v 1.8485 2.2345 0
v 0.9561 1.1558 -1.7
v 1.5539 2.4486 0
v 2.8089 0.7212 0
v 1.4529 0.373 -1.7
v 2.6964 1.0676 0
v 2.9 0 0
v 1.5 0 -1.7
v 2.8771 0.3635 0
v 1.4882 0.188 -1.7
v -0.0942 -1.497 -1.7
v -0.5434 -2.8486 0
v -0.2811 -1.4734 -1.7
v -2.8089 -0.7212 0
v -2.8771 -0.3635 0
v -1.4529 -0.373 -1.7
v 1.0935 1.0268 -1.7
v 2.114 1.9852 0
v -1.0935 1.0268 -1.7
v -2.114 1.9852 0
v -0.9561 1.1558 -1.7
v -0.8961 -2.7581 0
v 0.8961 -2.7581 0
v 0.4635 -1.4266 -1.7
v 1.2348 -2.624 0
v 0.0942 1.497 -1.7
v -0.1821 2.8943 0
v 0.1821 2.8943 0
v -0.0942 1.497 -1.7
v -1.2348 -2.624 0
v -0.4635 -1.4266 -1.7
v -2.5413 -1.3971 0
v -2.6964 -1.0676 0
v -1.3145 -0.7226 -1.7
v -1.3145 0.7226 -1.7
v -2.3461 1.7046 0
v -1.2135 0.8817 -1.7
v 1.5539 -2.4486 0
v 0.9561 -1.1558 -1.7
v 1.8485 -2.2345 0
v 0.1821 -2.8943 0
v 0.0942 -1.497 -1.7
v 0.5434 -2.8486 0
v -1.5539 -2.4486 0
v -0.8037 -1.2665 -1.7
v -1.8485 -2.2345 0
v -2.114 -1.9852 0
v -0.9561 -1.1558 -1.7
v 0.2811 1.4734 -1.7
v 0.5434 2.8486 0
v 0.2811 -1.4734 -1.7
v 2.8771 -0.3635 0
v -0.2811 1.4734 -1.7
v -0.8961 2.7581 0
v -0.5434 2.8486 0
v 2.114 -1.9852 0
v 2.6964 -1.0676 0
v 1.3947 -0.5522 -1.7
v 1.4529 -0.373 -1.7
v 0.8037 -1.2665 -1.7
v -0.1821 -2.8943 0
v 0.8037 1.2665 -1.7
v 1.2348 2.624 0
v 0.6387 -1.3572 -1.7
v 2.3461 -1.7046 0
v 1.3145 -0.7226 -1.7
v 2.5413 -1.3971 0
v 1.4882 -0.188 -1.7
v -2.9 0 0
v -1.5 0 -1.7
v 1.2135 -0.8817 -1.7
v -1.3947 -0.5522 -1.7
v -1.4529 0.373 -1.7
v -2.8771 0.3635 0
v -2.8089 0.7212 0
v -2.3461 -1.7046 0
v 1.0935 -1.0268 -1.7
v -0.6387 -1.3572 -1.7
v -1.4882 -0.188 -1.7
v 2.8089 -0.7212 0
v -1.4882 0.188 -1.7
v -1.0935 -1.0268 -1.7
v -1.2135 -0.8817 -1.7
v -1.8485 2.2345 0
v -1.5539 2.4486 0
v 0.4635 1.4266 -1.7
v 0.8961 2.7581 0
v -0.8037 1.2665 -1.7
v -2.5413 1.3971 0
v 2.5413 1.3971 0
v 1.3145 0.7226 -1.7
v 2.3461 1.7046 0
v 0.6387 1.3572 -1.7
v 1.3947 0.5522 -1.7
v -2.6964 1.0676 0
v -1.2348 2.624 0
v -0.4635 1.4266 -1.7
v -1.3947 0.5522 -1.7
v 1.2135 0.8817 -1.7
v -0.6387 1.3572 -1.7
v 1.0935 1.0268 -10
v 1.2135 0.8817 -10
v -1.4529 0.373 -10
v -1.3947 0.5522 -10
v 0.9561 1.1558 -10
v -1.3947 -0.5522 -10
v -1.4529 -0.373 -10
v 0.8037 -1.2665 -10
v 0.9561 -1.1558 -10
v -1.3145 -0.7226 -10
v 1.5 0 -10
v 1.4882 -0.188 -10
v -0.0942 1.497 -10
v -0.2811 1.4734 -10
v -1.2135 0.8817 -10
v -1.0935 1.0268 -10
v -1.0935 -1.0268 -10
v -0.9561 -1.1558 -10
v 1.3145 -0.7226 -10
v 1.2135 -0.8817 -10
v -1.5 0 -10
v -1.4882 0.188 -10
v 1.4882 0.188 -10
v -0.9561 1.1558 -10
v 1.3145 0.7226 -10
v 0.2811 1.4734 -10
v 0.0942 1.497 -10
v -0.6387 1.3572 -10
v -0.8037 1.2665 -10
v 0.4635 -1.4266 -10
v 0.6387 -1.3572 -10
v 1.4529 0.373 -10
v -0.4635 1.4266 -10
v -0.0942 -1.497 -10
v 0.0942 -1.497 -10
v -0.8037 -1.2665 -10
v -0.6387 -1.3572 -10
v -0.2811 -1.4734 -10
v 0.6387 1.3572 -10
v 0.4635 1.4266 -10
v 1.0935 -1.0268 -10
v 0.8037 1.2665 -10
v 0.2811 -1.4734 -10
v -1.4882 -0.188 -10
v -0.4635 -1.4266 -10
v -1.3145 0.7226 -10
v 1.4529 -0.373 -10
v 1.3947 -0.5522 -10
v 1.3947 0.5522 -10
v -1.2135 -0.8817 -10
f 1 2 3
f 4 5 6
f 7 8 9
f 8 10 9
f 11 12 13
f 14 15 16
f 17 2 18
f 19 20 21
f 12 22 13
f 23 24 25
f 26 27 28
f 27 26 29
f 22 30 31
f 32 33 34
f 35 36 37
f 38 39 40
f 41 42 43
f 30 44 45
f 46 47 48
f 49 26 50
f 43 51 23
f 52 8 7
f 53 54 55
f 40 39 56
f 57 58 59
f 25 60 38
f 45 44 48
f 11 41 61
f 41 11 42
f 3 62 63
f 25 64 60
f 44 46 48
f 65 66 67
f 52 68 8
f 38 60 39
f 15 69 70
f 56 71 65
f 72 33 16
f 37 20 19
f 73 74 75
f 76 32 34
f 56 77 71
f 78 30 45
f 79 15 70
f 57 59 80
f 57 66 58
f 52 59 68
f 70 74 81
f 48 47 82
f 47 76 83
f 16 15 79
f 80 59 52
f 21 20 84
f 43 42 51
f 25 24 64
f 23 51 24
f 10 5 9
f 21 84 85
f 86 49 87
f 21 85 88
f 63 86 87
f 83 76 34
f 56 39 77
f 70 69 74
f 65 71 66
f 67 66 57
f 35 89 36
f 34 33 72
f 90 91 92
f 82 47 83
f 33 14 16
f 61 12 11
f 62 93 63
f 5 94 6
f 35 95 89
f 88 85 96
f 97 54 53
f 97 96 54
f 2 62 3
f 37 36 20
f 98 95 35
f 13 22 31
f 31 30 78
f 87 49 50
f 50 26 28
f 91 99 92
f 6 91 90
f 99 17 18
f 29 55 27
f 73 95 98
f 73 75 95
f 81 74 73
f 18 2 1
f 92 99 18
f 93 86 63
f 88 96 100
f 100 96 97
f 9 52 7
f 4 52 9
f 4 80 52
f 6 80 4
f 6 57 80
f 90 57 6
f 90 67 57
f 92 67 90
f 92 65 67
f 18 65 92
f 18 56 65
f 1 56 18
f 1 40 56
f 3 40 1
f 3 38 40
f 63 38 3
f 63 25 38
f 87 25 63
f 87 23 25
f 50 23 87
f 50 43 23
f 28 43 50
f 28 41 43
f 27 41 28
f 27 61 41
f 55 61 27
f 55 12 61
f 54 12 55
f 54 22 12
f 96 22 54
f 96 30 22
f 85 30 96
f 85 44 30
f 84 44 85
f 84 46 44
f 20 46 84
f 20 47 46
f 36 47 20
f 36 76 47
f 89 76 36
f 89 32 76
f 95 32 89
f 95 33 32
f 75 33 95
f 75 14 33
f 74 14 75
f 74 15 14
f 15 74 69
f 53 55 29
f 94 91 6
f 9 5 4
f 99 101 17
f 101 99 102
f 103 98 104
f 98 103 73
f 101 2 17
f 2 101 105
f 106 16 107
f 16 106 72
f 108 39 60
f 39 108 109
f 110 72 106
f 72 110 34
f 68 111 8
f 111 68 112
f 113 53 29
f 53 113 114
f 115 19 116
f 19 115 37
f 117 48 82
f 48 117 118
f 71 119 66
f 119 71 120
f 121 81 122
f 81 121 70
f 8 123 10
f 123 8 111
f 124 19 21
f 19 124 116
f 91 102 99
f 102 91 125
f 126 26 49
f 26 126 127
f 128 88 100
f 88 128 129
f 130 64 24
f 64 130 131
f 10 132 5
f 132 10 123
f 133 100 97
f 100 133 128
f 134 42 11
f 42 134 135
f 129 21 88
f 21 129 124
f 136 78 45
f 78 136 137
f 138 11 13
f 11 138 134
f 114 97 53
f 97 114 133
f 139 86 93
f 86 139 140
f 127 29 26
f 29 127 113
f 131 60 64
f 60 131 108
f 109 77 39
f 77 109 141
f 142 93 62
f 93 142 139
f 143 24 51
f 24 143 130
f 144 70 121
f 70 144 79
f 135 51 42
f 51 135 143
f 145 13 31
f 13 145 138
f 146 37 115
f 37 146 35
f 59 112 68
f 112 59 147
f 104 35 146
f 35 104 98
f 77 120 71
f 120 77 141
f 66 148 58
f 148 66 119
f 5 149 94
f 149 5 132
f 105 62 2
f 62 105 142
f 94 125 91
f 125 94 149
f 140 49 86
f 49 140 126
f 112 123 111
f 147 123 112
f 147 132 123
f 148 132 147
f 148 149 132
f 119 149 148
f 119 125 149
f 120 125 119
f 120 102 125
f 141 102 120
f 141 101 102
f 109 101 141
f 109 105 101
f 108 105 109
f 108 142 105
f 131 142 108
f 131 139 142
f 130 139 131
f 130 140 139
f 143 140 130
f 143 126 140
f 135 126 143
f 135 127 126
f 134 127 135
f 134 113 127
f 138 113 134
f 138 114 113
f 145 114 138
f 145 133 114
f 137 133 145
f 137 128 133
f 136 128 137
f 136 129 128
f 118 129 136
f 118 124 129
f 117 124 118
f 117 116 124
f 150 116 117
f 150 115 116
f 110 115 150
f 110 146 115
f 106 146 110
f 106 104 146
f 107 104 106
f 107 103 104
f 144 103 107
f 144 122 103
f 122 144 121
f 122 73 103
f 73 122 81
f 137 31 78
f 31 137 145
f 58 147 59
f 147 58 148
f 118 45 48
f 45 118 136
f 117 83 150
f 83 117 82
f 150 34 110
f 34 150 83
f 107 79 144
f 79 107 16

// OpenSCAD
// Generated by SolidPython 1.1.3 on 2023-03-13 21:43:02
$fn = 50;


difference() {
	union() {
		translate(v = [0, 0, -1.7000000000]) {
			rotate(a = [0, 0, 0]) {
				cylinder(h = 1.7000000000, r1 = 1.5000000000, r2 = 2.9000000000);
			}
		}
		translate(v = [0, 0, -10]) {
			rotate(a = [0, 0, 0]) {
				cylinder(h = 10, r = 1.5000000000);
			}
		}
	}
	union();
}
/***********************************************
*********      SolidPython code:      **********
************************************************
 
from solid import *
import os
import subprocess

import oomB

import opsc_library_gen

mode = "laser"
#mode = "3d_print"

defined_objects = {}

radius_dict = {}
countersunk_dict = {}


def set_mode(m):
    global mode
    mode = m
    radius_dict['M6'] = 6.5/2
    radius_dict['M3'] = 3.3/2
    if mode == "laser":
        radius_dict['M6'] = 6/2
        radius_dict['M3'] = 3/2

    countersunk_dict['M3'] = {}
    countersunk_dict['M3']['little_rad'] = radius_dict['M3']
    countersunk_dict['M3']['big_rad'] = (5.5+0.6)/2
    if mode == "laser":
        countersunk_dict['M3']['big_rad'] = (4.75+0.6)/2
        countersunk_dict['M3']['little_rad'] = (4.75+0.6)/2

    countersunk_dict['M3']['height'] = 1.7


def opsc_make_object(filename, objects, save_type="none",resolution=50, layers = 1, tilediff = 200, mode="laser", overwrite=True):
    if overwrite or not os.path.exists(filename):
        set_mode(mode)
        save_type = save_type.lower()
        os.makedirs(os.path.dirname(filename), exist_ok=True)
        final_object = opsc_get_object(objects, mode = mode)
        # Save the final object to the specified filename    
        scad_render_to_file(final_object, filename, file_header='$fn = %s;' % resolution, include_orig_code=True)
        if save_type == "all":
            saveToAll(filename)
        elif save_type == "dxf":
            saveToDxf(filename)
        if mode == "laser":
            filename_laser = filename.replace(".scad","-flat.scad")
            scad_render_to_file(getLaser(final_object, layers=layers, tilediff=tilediff), filename_laser, file_header='$fn = %s;' % resolution, include_orig_code=True)
            if save_type == "all":
                saveToAll(filename_laser)
            elif save_type == "dxf":
                saveToDxf(filename_laser)


def opsc_get_object(objects, mode = "laser"):
    # Create the solidpython objects only include the positive objects and if they don't have inclusion or their inclusion is either all or mode
    # Initialize an empty list to store the results
    positive_objects = []

    # Iterate over the "objects" list
    for obj in objects:
        # Check if the current object has a "type" key with a value of "positive"
        if obj['type'] == 'positive':
            # Check if the current object has an "inclusion" key and its value matches "mode",
            # or if the current object does not have an "inclusion" key at all
            if not 'inclusion' in obj or obj['inclusion'] == "all" or obj['inclusion'] == mode:
                # Call the "get_opsc_item" function with the current object as an argument
                opsc_item = get_opsc_item(obj)
                # Add the result to the "positive_objects" list
                positive_objects.append(opsc_item)
# Initialize an empty list to store the results
    negative_objects = []

    # Iterate over the "objects" list
    for obj in objects:
        # Check if the current object has a "type" key with a value of "negative"
        if obj['type'] == 'negative':
            # Check if the current object has an "inclusion" key and its value matches "mode",
            # or if the current object does not have an "inclusion" key at all
            if not 'inclusion' in obj or obj['inclusion'] == "all" or obj['inclusion'] == mode:
                # Call the "get_opsc_item" function with the current object as an argument
                opsc_item = get_opsc_item(obj)
                # Add the result to the "negative_objects" list
                negative_objects.append(opsc_item)
    
    #positive_objects = [get_opsc_item(obj) for obj in objects if obj['type'] == 'positive']
    #negative_objects = [get_opsc_item(obj) for obj in objects if obj['type'] == 'negative']
    # Union the positive objects
    positive_object = union()(*positive_objects)
    # Union the negative objects
    negative_object = union()(*negative_objects)
    # Create the final object by subtracting the negative objects from the positive objects
    return difference()(positive_object, negative_object)

def get_opsc_item(params):
    # A dictionary to map radius string values to numerical values
    #radius_dict = {'small': 5, 'medium': 10, 'large': 15}
    # An array of function names for basic shapes
    basic_shapes = ['cube', 'sphere', 'cylinder']
    
    # An array of function names for other shapes
    other_shapes = ['hole', 'slot', 'rounded_rectangle', 'countersunk', 'polyg']
    


    # Convert radius to r if present, and remove radius from the params dictionary
    if 'radius' in params:
        if isinstance(params['radius'], str):
            # Use the radius_dict to map the radius string value to a numerical value
            params['r'] = radius_dict[params['radius']]
        else:
            params['r'] = params['radius']
        del params['radius']
    

    # Check if the object type is a basic shape
    if params['shape'] in basic_shapes:
        # Remove shape and unexpected dictionary values
        allowed_keys = {'size', 'r', 'r1', 'r2', 'd', 'h', 'rw', 'rh', 'dw', 'dh'}
        shape_params = {k: v for k, v in params.items() if k in allowed_keys}

        #params['m'] = "#"
        ###split for adding modifier
        try:
            m = params['m']
            func = globals()[params['shape']]
            return_value = get_opsc_transform(params,func(**shape_params))
            return_value = (return_value).set_modifier(m)
            return return_value
        except KeyError as e:
            return get_opsc_transform(params,globals()[params['shape']](**shape_params))
        
    elif params['shape'] == 'polygon':
        # Remove shape and unexpected dictionary values
        h  = params['height']
        allowed_keys = {'points'}
        shape_params = {k: v for k, v in params.items() if k in allowed_keys}

        # Call the corresponding function for the shape parameter, using ** notation to pass the shape_params dictionary as keyword arguments
        params["rot"] = [0,0,0]        
        try:
            m = params['m']
            func = globals()[params['shape']]
            return_value = get_opsc_transform(params,linear_extrude(h)(globals()[params['shape']](**shape_params)))
            return_value = (return_value).set_modifier(m)
            return return_value
        except KeyError as e:
            return_value = get_opsc_transform(params,linear_extrude(h)(globals()[params['shape']](**shape_params)))
            return_value = (return_value)
            return return_value


    # If the object type is not a basic shape, check if it's a defined object or one of the other shapes
    elif params['shape'] in other_shapes:
        # Call the corresponding function for the shape parameter, passing the params dictionary as an argument
        p2 = copy.deepcopy(params)
        p2["pos"] = [0,0,0]
        return get_opsc_transform(params,globals()[params['shape']](p2))
    
    # If the object is not a basic shape or a defined object, try to import it from a .scad file
    else:
        obj = defined_objects[params['shape']]
        return get_opsc_transform(params,obj)

def get_opsc_transform(params, solid_obj):
    # Rotate the object based on the 'rot' field in the params dictionary, or the 'rotX', 'rotY', and 'rotZ' fields if 'rot' is not present
    rot = params.get('rot', [])
    if rot:
        rotX, rotY, rotZ = rot
    else:
        rotX = params.get('rotX', 0)
        rotY = params.get('rotY', 0)
        rotZ = params.get('rotZ', 0)
    solid_obj = rotate([rotX, rotY, rotZ])(solid_obj)

    # Translate the object based on the 'pos' field in the params dictionary, or the 'x', 'y', and 'z' fields if 'pos' is not present
    pos = params.get('pos', [])
    if pos:
        x, y, z = pos
    else:
        x = params.get('x', 0)
        y = params.get('y', 0)
        z = params.get('z', 0)
    solid_obj = translate([x, y, z])(solid_obj)
    return solid_obj


import random

def opsc_easy_array(type, shape, repeats, pos_start, shift_arr, **kwargs):
    for i in range(0,3):
        repeats.append(1)
        pos_start.append(0)
        shift_arr.append(0)
    return_objects = []

    for x in range(0,repeats[0]):
        for y in range(0,repeats[1]):
            for z in range(0,repeats[2]):
                return_objects.append(opsc_easy(type, shape, pos=[pos_start[0]+x*shift_arr[0],pos_start[1]+y*shift_arr[1],pos_start[2]+z*shift_arr[2]], **kwargs))
    return return_objects                



def opsc_easy(type, shape, **kwargs):
    obj = {
        'type': type,
        'shape': shape
    }
    for param in ['size', 'r', 'r1', 'r2', 'd', 'h', 'rw', 'rh', 'dw', 'dh', 'pos', 'x', 'y', 'z', 'rot', 'rotX', 'rotY', 'rotZ', "w", "inclusion", 'sides', 'height', "m"]:
        if param in kwargs:
            obj[param] = kwargs[param]
    return obj

def hole(params):
    p2 = copy.deepcopy(params)  
    # Check if the radius is a string and replace it with the corresponding value from the dictionary
    if isinstance(p2['r'], str):
        p2['r'] = radius_dict[p2['r']]
    
    # Set the height to 100 if not specified
    if 'h' not in p2:
        p2['h'] = 100
        p2["pos"] = [0,0,-50]
    p2["center"] = True
    # Create the cylinder object
    p2["shape"] = "cylinder"
    p2["type"] = "positive"

    return get_opsc_item(p2)

import copy

def countersunk(params):
    p2 = copy.deepcopy(params)
    counter_rad = p2['r']
    p2['r'] = radius_dict[p2['r']]
    hp = copy.deepcopy(p2)
    hp["type"] = "positive"
    hp["shape"] = "hole"
    del hp["rot"]
    hol = get_opsc_item(hp)
    
    cp = copy.deepcopy(p2)
    cp["h"] = countersunk_dict[counter_rad]["height"]
    cp["r2"] = countersunk_dict[counter_rad]["little_rad"]
    cp["r1"] = countersunk_dict[counter_rad]["big_rad"]
    del cp["r"]
    del cp["rot"]
    cp["type"] = "positive"
    cp["shape"] = "cylinder"
    cp["pos"] = [0,0,0]

    top = get_opsc_item(cp)
    return union()(hol,top)



def slot(params):  
    p2 = copy.deepcopy(params) 
    if isinstance(p2['r'], str):
        p2['r'] = radius_dict[p2['r']]
    p2["type"] = "positive"
    p2["shape"] = "hole"
    del p2["rot"]
    p2["pos"] = [0,0,0]
    left = copy.deepcopy(p2)
    right = copy.deepcopy(p2)
    left["pos"][0] = p2["w"] / 2 - p2["r"] 
    
    right["pos"][0] = -p2["w"] / 2 + p2["r"] 
    pass
    leftObj = get_opsc_item(left)
    rightObj = get_opsc_item(right)
    return hull()(leftObj, rightObj)

def rounded_rectangle(params):   
    p2 = copy.deepcopy(params) 
    p2["h"] = p2["size"][2]
    p2["pos"] = p2.get("pos", [0, 0, 0]) 
    p2["type"] = "positive"
    p2["shape"] = "hole"
    p2["pos"] = [0,0,0]
    
    if 'rot' in p2:
        del p2["rot"]   
    if 'r' not in p2:
        p2["r"] = 5 
    tl = copy.deepcopy(p2)
    tr = copy.deepcopy(p2)
    bl = copy.deepcopy(p2)
    br = copy.deepcopy(p2)
    tl["pos"][0] = -(p2["size"][0] - p2["r"]*2)/2
    tl["pos"][1] = (p2["size"][1] - p2["r"]*2)/2
    tr["pos"][0] = (p2["size"][0] - p2["r"]*2)/2
    tr["pos"][1] = (p2["size"][1] - p2["r"]*2)/2
    bl["pos"][0] = -(p2["size"][0] - p2["r"]*2)/2
    bl["pos"][1] = -(p2["size"][1] - p2["r"]*2)/2
    br["pos"][0] = (p2["size"][0] - p2["r"]*2)/2
    br["pos"][1] = -(p2["size"][1] - p2["r"]*2)/2
    del tl["size"]
    del tr["size"]
    del bl["size"]
    del br["size"]
    tlo = get_opsc_item(tl)
    tro = get_opsc_item(tr)
    blo = get_opsc_item(bl)
    bro = get_opsc_item(br)    
    return hull()(tlo, tro, blo, bro)



def polyg(params):
    p2 = copy.deepcopy(params) 
    p2["type"] = "positive"
    p2["shape"] = "polygon"
    p2["pos"] = [0,0,0]
    sides = p2["sides"]
    radius = p2["r"]    
    angles = [i * 360 / sides for i in range(sides)]
    points = regular_polygon(sides, radius)
    
    p2["points"] = points
    return get_opsc_item(p2)

import math

def regular_polygon(num_sides, radius):
    # Calculate the angle between each side
    angle = 2 * math.pi / num_sides

    # Calculate the points of the polygon
    points = []
    for i in range(num_sides):
        x = radius * math.cos(i * angle)
        y = radius * math.sin(i * angle)
        points.append((x, y))
    return points

def import_scad_object(filename):
    # Import the .scad file and convert it to a solidpython object
    #filename = "parts"
    obj = import_scad(filename)
    return obj.main()



import os
import solid as solidpython

# A dictionary to store the defined objects


def load_scad_objects():
    opsc_library_gen.gen_library(defined_objects)

import random

def test(num_objects):
    objects = []
    for i in range(num_objects):
        # Choose a random shape
        #shape = random.choice(['cube', 'sphere', 'cylinder', 'hole', 'slot', "rounded_rectangle"])
        shape = random.choice(["rounded_rectangle"])

        # Choose a random type
        type = random.choice(['positive', 'negative'])
        
        # Create an empty object dictionary
        obj = {'shape': shape, 'type': type}
        
        # Set shape-specific parameters
        if obj['shape'] in ['cube']:
            obj['size'] =  [random.uniform(5, 15), random.uniform(5, 15), random.uniform(5, 15)]
        if obj['shape'] in ['rounded_rectangle']:
            obj['size'] =  [random.uniform(5, 15), random.uniform(5, 15), random.uniform(5, 15)]
            obj['r'] = random.uniform(0.5, 5)
        elif obj['shape'] == 'sphere':
            obj['r'] = random.uniform(5, 15)
        elif obj['shape'] in ['cylinder', 'hole']:
            obj['r'] = random.uniform(0.5, 5)
            obj['h'] = random.uniform(5, 15)
        elif obj['shape'] == 'slot':
            obj['r'] = random.uniform(0.5, 5)
            obj['h'] = random.uniform(5, 15)
            obj['w'] = random.uniform(5, 15)
        
        # Set a random position and rotation
        obj['pos'] = [random.uniform(-20, 20), random.uniform(-20, 20), random.uniform(-20, 20)]
        obj['rot'] = [random.uniform(-180, 180), random.uniform(-180, 180), random.uniform(-180, 180)]
        
        # Add the object to the list
        objects.append(obj)
    return objects

####### old file saving
def saveToAll(fileIn):
    saveToStl(fileIn)
    saveToDxf(fileIn)
    saveToPng(fileIn)
    saveToSvg(fileIn)

def saveToDxf(fileIn, fileOut="", copy_to_laser=True):
    if fileOut == "":
        fileOut = fileIn.replace(".scad",".dxf")
    saveToFile(fileIn, fileOut)


    
def saveToPng(fileIn, fileOut="",extra="--render"):
    if fileOut == "":
        fileOut = fileIn.replace(".scad",".png")
    saveToFile(fileIn, fileOut)

def saveToStl(fileIn, fileOut=""):
    if fileOut == "":
        fileOut = fileIn.replace(".scad",".stl")
    saveToFile(fileIn, fileOut)
    
def saveToSvg(fileIn, fileOut=""):
    if fileOut == "":
        fileOut = fileIn.replace(".scad",".svg")
    saveToFile(fileIn, fileOut)

def saveToFile(fileIn, fileOut,extra=""):
    #extra = extra + " --colorscheme Tomorrow"

    launchStr = 'openscad -o "' + fileOut + '"' + extra + ' "' + fileIn + '"'
    if ".png" in fileOut:
        launchStr = launchStr + " --render"
    print("            saveToFile launch string: " + launchStr)
    subprocess.run(launchStr)
    x=0

def getLaser(final_object,start=1.5,layers=1,thickness=3,tilediff=200):
        rv= []

        for x in range(layers):
            rv.append(translate([0,x*tilediff,0])(
                    projection()(
                        intersection()(translate([-500,-500,start+x*thickness])(cube(size=[1000,1000,0.1])),
                            final_object
                        )
                    )
            )
            )
            
        return union()(rv)

set_mode("laser")
load_scad_objects() 
 
************************************************/
